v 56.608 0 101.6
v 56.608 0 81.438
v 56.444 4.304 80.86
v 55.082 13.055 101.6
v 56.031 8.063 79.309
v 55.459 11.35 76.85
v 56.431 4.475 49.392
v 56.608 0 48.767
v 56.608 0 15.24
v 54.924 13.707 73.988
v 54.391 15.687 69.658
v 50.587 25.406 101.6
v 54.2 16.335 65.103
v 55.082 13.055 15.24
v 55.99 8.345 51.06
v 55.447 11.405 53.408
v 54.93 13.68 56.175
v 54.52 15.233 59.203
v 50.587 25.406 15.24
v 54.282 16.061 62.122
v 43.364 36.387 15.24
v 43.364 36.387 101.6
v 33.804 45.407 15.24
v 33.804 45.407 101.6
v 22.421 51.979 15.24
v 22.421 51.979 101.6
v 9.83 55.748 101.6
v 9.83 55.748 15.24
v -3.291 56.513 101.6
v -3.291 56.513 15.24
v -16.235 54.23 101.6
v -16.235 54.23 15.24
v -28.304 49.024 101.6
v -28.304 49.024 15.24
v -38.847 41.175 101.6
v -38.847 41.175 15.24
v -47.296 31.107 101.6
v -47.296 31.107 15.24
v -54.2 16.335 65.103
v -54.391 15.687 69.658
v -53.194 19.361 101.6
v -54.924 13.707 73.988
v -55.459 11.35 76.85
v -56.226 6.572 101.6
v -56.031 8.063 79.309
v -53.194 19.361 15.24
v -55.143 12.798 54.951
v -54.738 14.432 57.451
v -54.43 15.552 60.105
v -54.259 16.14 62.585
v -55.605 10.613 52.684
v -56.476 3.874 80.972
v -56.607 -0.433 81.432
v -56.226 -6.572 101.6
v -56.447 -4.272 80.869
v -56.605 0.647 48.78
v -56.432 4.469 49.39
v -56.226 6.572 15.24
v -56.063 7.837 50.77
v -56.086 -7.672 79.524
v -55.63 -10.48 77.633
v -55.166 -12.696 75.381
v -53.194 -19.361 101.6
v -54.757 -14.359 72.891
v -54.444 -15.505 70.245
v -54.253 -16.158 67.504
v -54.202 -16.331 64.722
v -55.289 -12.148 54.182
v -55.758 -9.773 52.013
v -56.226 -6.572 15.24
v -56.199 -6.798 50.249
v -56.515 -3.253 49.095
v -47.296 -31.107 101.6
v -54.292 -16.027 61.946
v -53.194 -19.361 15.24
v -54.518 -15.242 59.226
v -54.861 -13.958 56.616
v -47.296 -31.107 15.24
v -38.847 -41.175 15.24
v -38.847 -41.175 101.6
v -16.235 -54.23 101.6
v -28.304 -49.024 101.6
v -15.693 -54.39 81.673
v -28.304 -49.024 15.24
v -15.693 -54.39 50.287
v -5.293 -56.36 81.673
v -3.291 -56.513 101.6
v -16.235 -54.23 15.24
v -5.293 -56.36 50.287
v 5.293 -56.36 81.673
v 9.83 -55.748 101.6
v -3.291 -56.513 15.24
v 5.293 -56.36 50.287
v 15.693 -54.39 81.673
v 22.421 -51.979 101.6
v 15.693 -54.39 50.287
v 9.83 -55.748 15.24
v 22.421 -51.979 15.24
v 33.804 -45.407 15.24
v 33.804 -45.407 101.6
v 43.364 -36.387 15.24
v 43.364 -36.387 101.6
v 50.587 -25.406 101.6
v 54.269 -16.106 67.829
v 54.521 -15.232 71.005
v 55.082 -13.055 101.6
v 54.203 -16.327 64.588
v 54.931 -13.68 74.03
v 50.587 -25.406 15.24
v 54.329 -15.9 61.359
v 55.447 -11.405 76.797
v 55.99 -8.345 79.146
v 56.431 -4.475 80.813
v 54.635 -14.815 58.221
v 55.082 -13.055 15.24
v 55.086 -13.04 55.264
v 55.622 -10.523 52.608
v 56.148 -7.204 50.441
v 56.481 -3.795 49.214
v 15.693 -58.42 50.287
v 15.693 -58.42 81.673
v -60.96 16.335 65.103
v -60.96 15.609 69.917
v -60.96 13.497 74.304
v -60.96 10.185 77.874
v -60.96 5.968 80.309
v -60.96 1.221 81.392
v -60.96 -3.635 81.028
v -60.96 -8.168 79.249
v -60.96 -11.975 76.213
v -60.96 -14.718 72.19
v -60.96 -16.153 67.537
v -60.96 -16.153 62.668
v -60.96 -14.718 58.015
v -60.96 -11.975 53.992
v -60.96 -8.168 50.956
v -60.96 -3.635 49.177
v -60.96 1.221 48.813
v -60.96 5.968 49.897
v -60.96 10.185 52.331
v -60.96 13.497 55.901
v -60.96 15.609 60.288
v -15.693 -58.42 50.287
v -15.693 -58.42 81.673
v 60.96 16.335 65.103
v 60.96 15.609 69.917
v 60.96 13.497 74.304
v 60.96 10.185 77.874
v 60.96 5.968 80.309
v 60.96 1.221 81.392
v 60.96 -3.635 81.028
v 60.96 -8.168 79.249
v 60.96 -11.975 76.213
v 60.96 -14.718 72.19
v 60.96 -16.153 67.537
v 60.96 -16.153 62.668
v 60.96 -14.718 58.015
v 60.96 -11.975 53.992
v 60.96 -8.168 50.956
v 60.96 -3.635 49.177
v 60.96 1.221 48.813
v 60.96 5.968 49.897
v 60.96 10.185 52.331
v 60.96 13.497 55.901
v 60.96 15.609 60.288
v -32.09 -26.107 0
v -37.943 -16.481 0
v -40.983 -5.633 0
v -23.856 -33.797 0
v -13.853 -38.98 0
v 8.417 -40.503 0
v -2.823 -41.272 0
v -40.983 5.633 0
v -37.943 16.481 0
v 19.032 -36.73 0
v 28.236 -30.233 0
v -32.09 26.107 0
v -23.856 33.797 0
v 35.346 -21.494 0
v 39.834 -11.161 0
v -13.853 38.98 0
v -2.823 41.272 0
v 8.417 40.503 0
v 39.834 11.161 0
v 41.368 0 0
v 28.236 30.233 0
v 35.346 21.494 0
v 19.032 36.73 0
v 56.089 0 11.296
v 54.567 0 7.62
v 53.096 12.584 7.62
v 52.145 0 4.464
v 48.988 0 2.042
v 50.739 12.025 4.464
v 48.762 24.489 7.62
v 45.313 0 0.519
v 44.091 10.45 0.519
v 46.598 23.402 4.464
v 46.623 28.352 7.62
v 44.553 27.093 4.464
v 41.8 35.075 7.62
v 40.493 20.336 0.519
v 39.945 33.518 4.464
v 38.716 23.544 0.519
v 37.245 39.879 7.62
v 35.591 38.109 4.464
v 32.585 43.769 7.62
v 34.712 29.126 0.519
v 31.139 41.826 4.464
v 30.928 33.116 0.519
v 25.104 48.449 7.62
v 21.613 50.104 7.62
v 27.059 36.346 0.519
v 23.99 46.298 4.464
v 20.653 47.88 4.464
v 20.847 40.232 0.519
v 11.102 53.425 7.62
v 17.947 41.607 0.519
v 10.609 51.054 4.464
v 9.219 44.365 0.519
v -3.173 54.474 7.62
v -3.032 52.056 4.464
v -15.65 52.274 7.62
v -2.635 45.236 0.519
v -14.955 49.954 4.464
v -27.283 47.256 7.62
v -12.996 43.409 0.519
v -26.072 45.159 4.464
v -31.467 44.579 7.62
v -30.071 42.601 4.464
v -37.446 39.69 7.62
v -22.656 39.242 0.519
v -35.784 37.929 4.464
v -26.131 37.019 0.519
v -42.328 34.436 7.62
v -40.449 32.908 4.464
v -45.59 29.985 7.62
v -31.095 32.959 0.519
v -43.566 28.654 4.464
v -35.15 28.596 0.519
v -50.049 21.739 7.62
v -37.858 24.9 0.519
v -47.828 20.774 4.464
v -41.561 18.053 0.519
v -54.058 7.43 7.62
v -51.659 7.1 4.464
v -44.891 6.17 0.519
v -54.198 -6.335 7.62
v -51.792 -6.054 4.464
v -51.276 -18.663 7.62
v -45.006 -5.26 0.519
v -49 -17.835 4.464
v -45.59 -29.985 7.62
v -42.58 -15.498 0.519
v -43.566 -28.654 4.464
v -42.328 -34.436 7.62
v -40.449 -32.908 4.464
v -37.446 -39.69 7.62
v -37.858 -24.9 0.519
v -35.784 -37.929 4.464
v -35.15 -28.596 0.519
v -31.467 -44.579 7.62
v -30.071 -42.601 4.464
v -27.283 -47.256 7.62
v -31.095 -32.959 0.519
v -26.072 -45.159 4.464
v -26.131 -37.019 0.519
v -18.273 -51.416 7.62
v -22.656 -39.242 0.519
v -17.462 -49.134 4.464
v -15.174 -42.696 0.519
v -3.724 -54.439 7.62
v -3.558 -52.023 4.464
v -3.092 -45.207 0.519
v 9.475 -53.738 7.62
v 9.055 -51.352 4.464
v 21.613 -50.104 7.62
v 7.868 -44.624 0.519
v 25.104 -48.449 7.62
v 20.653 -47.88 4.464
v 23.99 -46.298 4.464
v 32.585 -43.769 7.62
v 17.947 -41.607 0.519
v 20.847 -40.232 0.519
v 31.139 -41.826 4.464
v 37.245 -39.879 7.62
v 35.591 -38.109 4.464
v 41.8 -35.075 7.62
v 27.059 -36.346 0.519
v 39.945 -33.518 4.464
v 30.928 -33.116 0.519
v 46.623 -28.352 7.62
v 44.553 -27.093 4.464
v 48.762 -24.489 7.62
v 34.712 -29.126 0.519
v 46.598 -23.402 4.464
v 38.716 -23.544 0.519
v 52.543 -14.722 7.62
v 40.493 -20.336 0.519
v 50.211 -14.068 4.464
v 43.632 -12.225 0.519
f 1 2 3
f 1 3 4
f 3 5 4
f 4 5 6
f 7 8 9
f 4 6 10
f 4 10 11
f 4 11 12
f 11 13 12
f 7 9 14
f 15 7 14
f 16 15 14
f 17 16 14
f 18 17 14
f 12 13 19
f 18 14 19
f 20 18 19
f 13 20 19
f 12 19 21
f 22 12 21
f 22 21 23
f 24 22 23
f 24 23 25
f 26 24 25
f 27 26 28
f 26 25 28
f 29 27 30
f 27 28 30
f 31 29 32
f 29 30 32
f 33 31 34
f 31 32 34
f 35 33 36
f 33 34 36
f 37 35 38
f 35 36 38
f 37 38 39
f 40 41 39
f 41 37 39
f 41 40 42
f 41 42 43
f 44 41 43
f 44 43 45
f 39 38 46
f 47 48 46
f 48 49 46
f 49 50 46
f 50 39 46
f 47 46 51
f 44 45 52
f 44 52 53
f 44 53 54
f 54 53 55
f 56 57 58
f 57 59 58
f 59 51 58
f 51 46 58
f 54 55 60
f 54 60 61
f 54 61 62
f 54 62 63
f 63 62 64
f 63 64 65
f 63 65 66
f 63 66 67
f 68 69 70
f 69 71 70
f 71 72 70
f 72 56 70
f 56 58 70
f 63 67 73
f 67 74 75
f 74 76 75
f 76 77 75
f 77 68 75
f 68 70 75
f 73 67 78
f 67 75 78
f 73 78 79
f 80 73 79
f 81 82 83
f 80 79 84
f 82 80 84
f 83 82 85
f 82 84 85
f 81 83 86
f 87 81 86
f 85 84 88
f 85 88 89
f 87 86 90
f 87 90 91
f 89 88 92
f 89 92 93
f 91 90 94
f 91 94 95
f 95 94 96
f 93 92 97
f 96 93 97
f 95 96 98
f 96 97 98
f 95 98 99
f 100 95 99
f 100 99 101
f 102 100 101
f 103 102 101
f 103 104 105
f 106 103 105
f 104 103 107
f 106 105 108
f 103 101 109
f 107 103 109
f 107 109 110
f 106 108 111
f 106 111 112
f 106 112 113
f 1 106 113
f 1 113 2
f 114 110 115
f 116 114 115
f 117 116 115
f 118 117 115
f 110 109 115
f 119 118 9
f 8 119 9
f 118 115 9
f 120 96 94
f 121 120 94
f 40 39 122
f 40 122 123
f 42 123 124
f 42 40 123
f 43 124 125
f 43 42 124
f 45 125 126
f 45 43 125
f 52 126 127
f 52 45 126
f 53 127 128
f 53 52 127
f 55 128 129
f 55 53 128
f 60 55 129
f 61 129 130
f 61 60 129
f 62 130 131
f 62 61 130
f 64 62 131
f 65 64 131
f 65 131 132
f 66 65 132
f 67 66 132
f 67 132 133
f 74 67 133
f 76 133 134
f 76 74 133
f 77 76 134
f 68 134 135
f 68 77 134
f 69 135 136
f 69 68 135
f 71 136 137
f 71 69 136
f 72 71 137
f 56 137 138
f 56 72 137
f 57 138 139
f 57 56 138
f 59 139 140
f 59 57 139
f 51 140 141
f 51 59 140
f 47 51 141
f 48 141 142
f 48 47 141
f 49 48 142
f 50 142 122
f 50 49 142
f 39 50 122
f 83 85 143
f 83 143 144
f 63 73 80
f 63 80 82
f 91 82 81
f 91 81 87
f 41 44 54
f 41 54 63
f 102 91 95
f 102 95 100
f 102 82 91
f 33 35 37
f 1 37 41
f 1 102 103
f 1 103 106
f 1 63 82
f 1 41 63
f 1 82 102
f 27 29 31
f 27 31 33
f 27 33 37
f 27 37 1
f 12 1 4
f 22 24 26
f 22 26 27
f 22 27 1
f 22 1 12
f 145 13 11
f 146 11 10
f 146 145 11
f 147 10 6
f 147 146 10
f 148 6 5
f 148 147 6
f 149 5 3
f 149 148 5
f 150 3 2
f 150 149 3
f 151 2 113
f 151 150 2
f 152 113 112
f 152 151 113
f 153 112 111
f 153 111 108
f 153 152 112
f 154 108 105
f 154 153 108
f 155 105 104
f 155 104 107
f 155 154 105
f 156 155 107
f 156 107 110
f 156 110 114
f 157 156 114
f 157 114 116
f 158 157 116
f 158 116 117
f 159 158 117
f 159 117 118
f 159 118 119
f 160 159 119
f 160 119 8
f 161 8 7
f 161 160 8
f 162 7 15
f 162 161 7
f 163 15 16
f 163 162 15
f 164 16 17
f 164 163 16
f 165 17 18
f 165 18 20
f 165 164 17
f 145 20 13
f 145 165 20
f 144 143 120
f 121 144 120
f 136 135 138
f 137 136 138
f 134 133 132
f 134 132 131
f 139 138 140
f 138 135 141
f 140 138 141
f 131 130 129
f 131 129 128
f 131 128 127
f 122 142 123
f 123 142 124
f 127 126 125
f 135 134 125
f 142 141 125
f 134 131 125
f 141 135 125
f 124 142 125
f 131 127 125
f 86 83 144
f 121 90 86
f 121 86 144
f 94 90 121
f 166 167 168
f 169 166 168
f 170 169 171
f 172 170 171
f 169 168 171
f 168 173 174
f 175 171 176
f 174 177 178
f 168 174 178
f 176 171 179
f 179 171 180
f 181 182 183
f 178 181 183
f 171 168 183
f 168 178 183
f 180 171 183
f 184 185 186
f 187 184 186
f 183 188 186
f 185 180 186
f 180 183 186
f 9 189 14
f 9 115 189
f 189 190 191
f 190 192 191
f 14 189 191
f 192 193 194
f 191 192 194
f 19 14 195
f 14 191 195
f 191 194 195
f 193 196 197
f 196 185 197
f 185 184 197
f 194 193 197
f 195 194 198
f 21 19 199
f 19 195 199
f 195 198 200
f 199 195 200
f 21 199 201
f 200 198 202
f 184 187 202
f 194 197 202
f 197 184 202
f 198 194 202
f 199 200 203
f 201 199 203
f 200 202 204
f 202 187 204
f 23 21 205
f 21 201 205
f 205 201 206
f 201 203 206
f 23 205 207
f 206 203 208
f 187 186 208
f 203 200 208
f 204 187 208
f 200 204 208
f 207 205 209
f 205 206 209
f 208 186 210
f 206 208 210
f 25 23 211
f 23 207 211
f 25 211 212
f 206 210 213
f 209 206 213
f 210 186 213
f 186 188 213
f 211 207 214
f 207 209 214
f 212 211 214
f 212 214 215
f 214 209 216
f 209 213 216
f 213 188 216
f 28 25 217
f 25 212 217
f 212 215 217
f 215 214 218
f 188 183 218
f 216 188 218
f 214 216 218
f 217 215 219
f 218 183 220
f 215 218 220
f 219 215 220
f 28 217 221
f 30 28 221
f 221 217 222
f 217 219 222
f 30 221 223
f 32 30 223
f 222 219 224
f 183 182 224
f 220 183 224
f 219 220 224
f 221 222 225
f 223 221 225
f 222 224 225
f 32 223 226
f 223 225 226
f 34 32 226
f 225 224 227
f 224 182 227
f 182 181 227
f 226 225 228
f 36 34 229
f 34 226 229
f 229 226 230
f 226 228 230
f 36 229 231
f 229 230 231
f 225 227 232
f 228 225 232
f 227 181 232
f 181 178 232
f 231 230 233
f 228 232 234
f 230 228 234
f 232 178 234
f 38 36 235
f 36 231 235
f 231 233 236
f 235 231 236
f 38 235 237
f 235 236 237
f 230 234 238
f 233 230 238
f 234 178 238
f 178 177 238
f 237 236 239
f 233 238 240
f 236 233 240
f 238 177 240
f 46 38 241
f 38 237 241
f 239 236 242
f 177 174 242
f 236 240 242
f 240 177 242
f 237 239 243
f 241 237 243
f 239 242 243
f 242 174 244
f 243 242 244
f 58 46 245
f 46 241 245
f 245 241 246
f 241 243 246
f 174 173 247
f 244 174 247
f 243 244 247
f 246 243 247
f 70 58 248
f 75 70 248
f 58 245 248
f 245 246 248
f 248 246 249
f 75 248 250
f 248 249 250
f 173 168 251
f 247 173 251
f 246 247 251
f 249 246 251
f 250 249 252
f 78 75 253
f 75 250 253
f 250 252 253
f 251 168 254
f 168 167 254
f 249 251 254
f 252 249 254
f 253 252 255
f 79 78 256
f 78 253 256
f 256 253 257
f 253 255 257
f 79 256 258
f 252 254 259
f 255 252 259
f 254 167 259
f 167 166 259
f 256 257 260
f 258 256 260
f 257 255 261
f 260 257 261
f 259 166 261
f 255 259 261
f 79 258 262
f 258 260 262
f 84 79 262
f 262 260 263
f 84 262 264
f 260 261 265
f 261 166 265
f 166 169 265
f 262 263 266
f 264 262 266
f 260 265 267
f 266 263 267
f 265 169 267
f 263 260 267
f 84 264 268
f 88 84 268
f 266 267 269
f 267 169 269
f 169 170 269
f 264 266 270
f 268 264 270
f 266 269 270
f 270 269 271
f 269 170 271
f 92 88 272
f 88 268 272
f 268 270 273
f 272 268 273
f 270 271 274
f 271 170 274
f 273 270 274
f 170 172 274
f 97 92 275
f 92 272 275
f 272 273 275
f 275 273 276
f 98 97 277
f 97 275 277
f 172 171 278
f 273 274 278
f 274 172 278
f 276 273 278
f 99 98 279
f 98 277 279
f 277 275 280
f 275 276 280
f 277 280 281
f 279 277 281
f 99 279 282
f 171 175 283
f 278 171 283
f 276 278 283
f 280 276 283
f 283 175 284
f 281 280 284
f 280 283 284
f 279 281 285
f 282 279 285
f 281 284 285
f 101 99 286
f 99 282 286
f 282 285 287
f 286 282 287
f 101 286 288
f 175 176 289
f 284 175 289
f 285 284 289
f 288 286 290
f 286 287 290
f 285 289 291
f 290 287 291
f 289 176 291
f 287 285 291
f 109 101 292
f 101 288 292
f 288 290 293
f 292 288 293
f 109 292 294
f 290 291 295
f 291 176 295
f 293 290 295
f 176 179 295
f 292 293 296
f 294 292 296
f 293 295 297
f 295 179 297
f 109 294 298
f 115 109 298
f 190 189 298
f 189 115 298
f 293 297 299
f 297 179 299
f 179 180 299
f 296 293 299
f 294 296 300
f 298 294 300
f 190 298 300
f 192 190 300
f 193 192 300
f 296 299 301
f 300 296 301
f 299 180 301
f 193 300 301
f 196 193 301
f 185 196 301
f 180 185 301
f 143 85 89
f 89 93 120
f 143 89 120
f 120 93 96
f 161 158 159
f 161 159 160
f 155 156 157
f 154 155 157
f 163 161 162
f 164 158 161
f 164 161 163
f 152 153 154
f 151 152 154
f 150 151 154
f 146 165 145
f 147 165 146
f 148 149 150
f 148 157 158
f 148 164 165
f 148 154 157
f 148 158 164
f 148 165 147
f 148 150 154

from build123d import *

# Parameters (mm, degrees)
F0_R     = 56.608294
F1_DEPTH = 101.6
F2_R     = 15.24
F3_W     = 31.386364
F3_H     = 31.386374
F4_DEPTH = 58.42
F5_R     = 16.335197
F6_DEPTH = 60.96


with BuildPart() as f1:
    # F0 (on Top) → F1 (new body)
    with BuildSketch(Plane.XY):
        Circle(F0_R)
    extrude(amount=F1_DEPTH)

    # F2
    f2_edges = [f1.edges().sort_by_distance(p)[0] for p in [
        (-56.608294, 0, 0),
    ]]
    fillet(f2_edges, radius=F2_R)

    # F3 (on Front) → F4 (join)
    with BuildSketch(Plane.XZ):
        with Locations((0, 65.980129)):
            Rectangle(F3_W, F3_H)
    extrude(amount=F4_DEPTH)

    # F5 (on Right) → F6 (join, symmetric)
    with BuildSketch(Plane.YZ):
        with Locations((0, 65.102533)):
            Circle(F5_R)
    extrude(amount=F6_DEPTH, both=True)


solid = f1.part
